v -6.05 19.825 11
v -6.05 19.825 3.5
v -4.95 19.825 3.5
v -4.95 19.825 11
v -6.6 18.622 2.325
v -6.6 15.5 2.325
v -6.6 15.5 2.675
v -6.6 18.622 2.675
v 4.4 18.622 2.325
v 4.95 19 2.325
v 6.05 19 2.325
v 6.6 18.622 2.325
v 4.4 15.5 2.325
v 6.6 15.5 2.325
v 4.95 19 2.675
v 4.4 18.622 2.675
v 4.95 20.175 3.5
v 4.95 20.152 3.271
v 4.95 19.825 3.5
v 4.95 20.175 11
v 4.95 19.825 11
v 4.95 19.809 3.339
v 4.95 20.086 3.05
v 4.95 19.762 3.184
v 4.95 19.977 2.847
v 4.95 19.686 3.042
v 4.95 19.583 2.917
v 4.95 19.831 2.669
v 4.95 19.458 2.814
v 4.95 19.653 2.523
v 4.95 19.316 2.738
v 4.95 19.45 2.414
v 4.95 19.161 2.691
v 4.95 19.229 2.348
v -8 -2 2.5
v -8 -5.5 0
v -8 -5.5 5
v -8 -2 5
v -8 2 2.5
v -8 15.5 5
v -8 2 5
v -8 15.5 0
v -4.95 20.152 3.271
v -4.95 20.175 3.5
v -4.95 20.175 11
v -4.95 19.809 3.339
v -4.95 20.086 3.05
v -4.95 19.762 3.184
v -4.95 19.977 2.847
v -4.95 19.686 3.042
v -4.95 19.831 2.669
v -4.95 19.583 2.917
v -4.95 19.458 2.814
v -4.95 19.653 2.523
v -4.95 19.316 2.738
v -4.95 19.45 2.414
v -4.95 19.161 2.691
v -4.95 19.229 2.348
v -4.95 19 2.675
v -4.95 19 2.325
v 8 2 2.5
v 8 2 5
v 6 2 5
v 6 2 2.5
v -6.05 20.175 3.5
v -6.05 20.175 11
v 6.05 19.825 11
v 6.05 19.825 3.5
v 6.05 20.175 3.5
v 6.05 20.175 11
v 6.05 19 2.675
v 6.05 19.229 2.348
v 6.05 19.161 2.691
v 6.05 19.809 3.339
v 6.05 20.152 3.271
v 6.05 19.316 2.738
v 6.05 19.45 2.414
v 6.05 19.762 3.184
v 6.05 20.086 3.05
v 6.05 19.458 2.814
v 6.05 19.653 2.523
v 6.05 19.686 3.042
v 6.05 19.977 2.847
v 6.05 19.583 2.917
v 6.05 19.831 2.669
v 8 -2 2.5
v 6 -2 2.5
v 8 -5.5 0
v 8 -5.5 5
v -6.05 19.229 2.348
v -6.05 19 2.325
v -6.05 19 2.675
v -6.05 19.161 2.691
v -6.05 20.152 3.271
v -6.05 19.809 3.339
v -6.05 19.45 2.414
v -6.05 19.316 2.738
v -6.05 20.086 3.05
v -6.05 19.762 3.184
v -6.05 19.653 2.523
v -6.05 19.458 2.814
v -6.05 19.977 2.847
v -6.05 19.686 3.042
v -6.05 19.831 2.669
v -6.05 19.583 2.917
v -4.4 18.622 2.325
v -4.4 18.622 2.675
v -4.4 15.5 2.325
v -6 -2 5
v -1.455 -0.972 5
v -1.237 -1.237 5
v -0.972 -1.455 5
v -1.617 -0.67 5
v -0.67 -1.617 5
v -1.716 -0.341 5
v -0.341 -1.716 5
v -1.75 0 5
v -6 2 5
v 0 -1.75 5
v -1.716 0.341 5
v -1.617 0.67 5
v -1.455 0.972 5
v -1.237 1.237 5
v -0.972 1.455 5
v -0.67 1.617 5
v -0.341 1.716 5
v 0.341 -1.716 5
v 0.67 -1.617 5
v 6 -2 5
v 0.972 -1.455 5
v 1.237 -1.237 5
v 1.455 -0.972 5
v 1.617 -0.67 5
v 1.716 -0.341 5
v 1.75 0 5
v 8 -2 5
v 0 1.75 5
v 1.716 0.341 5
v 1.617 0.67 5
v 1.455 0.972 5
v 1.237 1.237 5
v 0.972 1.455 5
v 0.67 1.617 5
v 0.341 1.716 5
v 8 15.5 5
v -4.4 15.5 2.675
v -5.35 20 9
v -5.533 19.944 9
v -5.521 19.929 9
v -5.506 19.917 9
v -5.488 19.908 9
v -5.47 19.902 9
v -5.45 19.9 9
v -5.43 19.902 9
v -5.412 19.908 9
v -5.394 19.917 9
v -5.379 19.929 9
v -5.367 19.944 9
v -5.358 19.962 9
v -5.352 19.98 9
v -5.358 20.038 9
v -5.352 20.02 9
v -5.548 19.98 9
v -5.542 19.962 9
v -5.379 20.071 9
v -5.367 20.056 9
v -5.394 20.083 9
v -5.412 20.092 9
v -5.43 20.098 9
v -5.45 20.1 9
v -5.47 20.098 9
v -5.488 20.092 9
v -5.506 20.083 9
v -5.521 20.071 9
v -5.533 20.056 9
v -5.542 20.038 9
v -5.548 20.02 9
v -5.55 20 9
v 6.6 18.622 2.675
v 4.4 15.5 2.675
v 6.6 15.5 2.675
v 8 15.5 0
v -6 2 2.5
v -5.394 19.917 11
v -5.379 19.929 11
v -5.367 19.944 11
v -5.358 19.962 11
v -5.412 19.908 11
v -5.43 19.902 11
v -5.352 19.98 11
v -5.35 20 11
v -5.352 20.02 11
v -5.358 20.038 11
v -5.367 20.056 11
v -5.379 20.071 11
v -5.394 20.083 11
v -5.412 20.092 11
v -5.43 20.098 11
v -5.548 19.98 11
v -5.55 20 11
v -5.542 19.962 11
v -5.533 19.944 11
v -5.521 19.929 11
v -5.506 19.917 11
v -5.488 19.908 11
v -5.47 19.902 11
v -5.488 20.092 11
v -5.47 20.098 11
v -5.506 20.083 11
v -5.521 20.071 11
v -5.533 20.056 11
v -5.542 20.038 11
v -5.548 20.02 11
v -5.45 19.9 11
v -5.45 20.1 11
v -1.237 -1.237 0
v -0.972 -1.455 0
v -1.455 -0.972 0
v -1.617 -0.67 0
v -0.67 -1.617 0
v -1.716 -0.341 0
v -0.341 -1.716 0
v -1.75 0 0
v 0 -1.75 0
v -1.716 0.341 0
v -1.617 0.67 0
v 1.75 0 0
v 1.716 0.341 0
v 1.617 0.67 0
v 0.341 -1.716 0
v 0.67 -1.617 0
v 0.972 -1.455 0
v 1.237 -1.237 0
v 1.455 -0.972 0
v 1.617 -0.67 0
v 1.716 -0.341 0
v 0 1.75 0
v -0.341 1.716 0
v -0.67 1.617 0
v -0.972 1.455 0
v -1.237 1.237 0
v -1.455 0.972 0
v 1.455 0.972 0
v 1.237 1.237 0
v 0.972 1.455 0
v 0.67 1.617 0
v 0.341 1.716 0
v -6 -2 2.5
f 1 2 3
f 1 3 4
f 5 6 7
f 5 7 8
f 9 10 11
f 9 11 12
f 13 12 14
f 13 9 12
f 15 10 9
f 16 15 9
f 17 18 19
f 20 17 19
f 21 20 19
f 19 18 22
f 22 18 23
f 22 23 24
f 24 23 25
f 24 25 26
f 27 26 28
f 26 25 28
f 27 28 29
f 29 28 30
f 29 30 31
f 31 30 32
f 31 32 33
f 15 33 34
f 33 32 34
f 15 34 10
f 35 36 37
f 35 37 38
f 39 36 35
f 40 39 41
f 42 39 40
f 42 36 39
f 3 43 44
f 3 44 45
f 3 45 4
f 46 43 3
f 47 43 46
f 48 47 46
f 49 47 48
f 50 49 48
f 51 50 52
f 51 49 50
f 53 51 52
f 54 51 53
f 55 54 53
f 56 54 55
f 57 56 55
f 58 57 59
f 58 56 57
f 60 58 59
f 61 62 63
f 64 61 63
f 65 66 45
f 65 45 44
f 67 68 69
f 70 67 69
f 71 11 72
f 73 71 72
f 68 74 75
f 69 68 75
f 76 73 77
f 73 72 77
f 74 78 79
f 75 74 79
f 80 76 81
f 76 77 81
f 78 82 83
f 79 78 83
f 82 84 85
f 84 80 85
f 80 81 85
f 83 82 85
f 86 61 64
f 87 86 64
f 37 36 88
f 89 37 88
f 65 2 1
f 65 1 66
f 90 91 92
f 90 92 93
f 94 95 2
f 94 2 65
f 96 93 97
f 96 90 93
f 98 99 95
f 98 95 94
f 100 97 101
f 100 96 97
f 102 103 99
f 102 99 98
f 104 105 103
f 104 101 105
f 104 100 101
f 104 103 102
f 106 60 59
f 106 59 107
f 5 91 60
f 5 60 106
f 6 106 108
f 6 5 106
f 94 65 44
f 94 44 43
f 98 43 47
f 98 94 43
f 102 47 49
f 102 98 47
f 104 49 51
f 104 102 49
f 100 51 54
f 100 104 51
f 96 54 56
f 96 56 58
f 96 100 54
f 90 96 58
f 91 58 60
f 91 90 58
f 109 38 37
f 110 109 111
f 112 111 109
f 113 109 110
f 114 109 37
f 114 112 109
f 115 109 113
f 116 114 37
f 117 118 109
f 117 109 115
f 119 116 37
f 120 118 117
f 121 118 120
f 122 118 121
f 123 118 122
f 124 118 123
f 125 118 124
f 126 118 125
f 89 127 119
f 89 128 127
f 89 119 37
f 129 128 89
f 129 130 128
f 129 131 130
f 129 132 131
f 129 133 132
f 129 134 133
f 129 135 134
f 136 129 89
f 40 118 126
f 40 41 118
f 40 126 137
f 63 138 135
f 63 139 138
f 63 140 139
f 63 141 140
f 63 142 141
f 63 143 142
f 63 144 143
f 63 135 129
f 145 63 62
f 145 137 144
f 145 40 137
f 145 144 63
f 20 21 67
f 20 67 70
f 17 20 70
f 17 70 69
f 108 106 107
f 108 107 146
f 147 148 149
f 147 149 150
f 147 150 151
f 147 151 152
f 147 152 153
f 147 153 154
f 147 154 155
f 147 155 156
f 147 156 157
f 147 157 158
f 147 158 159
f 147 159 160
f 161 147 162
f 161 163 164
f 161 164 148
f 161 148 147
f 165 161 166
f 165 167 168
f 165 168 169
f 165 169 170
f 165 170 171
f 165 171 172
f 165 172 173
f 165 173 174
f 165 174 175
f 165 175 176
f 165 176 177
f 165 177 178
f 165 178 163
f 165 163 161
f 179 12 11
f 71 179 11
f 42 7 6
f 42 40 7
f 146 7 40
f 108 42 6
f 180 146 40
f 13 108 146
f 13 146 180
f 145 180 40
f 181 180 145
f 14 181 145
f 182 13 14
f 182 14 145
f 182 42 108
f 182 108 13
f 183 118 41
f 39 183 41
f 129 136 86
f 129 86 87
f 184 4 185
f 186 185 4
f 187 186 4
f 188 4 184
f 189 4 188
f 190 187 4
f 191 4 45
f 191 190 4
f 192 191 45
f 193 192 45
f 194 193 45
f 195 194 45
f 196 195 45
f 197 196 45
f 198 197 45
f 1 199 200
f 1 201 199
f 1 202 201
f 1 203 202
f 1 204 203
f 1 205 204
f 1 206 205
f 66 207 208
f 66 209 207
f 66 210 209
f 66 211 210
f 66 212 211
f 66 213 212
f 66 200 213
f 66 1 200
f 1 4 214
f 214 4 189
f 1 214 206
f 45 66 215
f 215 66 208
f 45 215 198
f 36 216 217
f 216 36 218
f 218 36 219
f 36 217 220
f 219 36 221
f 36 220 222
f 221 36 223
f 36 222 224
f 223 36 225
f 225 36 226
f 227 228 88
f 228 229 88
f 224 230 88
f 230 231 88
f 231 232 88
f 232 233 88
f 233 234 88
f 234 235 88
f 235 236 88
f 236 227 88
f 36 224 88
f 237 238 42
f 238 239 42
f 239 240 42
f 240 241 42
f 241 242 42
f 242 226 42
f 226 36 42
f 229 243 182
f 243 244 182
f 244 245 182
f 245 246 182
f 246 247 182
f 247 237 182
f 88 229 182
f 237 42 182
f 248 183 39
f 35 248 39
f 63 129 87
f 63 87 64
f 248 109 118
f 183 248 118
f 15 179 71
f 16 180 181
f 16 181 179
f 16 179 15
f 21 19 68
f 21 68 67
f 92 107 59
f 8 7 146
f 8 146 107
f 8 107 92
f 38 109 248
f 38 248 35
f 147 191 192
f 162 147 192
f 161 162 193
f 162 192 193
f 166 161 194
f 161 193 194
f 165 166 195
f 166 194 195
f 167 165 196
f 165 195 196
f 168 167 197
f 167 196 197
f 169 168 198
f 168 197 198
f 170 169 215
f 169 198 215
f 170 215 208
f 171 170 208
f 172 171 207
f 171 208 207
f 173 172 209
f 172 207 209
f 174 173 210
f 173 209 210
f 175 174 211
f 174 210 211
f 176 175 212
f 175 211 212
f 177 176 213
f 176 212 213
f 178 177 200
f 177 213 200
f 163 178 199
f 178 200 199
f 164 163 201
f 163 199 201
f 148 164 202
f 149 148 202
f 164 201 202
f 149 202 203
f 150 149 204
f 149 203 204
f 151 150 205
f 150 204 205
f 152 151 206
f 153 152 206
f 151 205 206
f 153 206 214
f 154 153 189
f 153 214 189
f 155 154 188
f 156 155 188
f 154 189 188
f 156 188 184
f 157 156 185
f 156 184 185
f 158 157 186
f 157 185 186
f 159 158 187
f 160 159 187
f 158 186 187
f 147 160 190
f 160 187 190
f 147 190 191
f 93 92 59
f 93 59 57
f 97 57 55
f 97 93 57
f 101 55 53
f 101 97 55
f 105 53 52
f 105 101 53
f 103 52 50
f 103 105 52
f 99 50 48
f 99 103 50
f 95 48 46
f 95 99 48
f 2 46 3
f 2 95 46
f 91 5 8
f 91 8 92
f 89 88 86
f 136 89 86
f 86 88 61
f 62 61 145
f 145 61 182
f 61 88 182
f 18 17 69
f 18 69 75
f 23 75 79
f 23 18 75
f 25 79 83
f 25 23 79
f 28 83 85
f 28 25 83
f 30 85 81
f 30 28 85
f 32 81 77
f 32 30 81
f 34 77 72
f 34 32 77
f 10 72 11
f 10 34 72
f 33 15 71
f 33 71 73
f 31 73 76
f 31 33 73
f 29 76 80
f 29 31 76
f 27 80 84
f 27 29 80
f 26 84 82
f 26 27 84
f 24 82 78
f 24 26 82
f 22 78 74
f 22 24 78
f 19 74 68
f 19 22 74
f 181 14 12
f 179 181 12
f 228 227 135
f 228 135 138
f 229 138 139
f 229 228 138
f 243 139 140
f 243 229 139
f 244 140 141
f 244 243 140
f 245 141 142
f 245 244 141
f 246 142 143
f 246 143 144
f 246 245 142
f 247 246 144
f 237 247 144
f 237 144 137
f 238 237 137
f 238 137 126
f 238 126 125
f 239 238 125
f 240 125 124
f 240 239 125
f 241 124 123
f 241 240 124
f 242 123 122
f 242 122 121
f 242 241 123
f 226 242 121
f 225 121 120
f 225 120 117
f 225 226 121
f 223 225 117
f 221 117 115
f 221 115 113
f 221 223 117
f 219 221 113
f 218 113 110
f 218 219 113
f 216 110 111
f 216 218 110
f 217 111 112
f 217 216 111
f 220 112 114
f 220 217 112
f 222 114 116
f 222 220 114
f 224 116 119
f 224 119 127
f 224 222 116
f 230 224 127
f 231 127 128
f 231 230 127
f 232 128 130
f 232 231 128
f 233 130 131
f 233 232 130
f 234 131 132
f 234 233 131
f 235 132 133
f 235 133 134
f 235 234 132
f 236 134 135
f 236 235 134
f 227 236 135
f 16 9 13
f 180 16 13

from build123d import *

# Parameters (mm, degrees)
SKETCH_1_W          = 16
SKETCH_1_H          = 21
SKETCH_1_R          = 1.75
EXTRUDE_1_DEPTH     = 5
EXTRUDE_1_2_DEPTH   = 16
CUT_EXTRUDE_1_DEPTH = 16
SKETCH_4_W          = 3.81913455
SKETCH_4_H          = 4
CUT_EXTRUDE_2_DEPTH = 2.5
SKETCH_5_R          = 0.1
CUT_EXTRUDE_3_DEPTH = 2
SKETCH_6_W          = 6.153050109
SKETCH_6_H          = 6.032352941
CUT_EXTRUDE_4_DEPTH = 10


with BuildPart() as part:
    # Эскиз1 → Extrude 1 (new body)
    with BuildSketch(Plane.XY):
        with Locations((0, 5)):
            Rectangle(SKETCH_1_W, SKETCH_1_H)
        Circle(SKETCH_1_R, mode=Mode.SUBTRACT)
    extrude(amount=EXTRUDE_1_DEPTH)

    # Эскиз2 → Extrude 1 2 (add)
    with BuildSketch(Plane.ZY.offset(8)):
        with BuildLine():
            Line((2.675, 15.5), (2.675, 19))
            ThreePointArc((2.675, 19), (2.916636906, 19.583363094), (3.5, 19.825))
            Line((3.5, 19.825), (11, 19.825))
            Line((11, 19.825), (11, 20.175))
            Line((11, 20.175), (3.5, 20.175))
            ThreePointArc((3.5, 20.175), (2.669149532, 19.830850468), (2.325, 19))
            Line((2.325, 19), (2.325, 15.5))
            Line((2.325, 15.5), (2.675, 15.5))
        make_face()
    extrude(amount=-EXTRUDE_1_2_DEPTH)

    # Эскиз3 → Вырез-Вытянуть1 (cut)
    with BuildSketch(Plane(origin=(0, 0, 2.325), x_dir=(-1, 0, 0), z_dir=(0, 0, -1))):
        Polygon((-1.75, 15.5), (-1.75, 18.5), (-0.55, 19), (-0.55, 20.937907948), (-4.95, 20.937907948), (-4.95, 19), (-4.4, 18.622085888), (-4.4, 15.5), align=None)
        Polygon((0.55, 19), (0.55, 20.937907948), (4.95, 20.937907948), (4.95, 19), (4.4, 18.622085888), (4.4, 15.5), (1.75, 15.5), (1.75, 18.5), align=None)
        Polygon((-6.05, 19), (-6.05, 20.937907948), (-9.320905805, 20.937907948), (-9.320905805, 15.5), (-6.6, 15.5), (-6.6, 18.622085888), align=None)
        Polygon((6.05, 19), (6.05, 20.937907948), (9.499807758, 20.937907948), (9.499807758, 15.5), (6.6, 15.5), (6.6, 18.622085888), align=None)
    extrude(amount=-CUT_EXTRUDE_1_DEPTH, mode=Mode.SUBTRACT)

    # Эскиз4 → Вырез-Вытянуть2 (cut)
    with BuildSketch(Plane(origin=(0, 0, 5), x_dir=(-1, 0, 0), z_dir=(0, 0, -1))):
        with Locations((7.909567275, 0)):
            Rectangle(SKETCH_4_W, SKETCH_4_H)
        with Locations((-7.909567275, 0)):
            Rectangle(SKETCH_4_W, SKETCH_4_H)
    extrude(amount=CUT_EXTRUDE_2_DEPTH, mode=Mode.SUBTRACT)

    # Эскиз5 → Вырез-Вытянуть3 (cut)
    with BuildSketch(Plane.XY.offset(11)):
        with Locations((-5.45, 20)):
            Circle(SKETCH_5_R)
    extrude(amount=-CUT_EXTRUDE_3_DEPTH, mode=Mode.SUBTRACT)

    # Эскиз6 → Вырез-Вытянуть4 (cut)
    with BuildSketch(Plane(origin=(0, 0, 2.325), x_dir=(-1, 0, 0), z_dir=(0, 0, -1))):
        with Locations((0.350490197, 18.516176471)):
            Rectangle(SKETCH_6_W, SKETCH_6_H)
    extrude(amount=-CUT_EXTRUDE_4_DEPTH, mode=Mode.SUBTRACT)


solid = part.part
